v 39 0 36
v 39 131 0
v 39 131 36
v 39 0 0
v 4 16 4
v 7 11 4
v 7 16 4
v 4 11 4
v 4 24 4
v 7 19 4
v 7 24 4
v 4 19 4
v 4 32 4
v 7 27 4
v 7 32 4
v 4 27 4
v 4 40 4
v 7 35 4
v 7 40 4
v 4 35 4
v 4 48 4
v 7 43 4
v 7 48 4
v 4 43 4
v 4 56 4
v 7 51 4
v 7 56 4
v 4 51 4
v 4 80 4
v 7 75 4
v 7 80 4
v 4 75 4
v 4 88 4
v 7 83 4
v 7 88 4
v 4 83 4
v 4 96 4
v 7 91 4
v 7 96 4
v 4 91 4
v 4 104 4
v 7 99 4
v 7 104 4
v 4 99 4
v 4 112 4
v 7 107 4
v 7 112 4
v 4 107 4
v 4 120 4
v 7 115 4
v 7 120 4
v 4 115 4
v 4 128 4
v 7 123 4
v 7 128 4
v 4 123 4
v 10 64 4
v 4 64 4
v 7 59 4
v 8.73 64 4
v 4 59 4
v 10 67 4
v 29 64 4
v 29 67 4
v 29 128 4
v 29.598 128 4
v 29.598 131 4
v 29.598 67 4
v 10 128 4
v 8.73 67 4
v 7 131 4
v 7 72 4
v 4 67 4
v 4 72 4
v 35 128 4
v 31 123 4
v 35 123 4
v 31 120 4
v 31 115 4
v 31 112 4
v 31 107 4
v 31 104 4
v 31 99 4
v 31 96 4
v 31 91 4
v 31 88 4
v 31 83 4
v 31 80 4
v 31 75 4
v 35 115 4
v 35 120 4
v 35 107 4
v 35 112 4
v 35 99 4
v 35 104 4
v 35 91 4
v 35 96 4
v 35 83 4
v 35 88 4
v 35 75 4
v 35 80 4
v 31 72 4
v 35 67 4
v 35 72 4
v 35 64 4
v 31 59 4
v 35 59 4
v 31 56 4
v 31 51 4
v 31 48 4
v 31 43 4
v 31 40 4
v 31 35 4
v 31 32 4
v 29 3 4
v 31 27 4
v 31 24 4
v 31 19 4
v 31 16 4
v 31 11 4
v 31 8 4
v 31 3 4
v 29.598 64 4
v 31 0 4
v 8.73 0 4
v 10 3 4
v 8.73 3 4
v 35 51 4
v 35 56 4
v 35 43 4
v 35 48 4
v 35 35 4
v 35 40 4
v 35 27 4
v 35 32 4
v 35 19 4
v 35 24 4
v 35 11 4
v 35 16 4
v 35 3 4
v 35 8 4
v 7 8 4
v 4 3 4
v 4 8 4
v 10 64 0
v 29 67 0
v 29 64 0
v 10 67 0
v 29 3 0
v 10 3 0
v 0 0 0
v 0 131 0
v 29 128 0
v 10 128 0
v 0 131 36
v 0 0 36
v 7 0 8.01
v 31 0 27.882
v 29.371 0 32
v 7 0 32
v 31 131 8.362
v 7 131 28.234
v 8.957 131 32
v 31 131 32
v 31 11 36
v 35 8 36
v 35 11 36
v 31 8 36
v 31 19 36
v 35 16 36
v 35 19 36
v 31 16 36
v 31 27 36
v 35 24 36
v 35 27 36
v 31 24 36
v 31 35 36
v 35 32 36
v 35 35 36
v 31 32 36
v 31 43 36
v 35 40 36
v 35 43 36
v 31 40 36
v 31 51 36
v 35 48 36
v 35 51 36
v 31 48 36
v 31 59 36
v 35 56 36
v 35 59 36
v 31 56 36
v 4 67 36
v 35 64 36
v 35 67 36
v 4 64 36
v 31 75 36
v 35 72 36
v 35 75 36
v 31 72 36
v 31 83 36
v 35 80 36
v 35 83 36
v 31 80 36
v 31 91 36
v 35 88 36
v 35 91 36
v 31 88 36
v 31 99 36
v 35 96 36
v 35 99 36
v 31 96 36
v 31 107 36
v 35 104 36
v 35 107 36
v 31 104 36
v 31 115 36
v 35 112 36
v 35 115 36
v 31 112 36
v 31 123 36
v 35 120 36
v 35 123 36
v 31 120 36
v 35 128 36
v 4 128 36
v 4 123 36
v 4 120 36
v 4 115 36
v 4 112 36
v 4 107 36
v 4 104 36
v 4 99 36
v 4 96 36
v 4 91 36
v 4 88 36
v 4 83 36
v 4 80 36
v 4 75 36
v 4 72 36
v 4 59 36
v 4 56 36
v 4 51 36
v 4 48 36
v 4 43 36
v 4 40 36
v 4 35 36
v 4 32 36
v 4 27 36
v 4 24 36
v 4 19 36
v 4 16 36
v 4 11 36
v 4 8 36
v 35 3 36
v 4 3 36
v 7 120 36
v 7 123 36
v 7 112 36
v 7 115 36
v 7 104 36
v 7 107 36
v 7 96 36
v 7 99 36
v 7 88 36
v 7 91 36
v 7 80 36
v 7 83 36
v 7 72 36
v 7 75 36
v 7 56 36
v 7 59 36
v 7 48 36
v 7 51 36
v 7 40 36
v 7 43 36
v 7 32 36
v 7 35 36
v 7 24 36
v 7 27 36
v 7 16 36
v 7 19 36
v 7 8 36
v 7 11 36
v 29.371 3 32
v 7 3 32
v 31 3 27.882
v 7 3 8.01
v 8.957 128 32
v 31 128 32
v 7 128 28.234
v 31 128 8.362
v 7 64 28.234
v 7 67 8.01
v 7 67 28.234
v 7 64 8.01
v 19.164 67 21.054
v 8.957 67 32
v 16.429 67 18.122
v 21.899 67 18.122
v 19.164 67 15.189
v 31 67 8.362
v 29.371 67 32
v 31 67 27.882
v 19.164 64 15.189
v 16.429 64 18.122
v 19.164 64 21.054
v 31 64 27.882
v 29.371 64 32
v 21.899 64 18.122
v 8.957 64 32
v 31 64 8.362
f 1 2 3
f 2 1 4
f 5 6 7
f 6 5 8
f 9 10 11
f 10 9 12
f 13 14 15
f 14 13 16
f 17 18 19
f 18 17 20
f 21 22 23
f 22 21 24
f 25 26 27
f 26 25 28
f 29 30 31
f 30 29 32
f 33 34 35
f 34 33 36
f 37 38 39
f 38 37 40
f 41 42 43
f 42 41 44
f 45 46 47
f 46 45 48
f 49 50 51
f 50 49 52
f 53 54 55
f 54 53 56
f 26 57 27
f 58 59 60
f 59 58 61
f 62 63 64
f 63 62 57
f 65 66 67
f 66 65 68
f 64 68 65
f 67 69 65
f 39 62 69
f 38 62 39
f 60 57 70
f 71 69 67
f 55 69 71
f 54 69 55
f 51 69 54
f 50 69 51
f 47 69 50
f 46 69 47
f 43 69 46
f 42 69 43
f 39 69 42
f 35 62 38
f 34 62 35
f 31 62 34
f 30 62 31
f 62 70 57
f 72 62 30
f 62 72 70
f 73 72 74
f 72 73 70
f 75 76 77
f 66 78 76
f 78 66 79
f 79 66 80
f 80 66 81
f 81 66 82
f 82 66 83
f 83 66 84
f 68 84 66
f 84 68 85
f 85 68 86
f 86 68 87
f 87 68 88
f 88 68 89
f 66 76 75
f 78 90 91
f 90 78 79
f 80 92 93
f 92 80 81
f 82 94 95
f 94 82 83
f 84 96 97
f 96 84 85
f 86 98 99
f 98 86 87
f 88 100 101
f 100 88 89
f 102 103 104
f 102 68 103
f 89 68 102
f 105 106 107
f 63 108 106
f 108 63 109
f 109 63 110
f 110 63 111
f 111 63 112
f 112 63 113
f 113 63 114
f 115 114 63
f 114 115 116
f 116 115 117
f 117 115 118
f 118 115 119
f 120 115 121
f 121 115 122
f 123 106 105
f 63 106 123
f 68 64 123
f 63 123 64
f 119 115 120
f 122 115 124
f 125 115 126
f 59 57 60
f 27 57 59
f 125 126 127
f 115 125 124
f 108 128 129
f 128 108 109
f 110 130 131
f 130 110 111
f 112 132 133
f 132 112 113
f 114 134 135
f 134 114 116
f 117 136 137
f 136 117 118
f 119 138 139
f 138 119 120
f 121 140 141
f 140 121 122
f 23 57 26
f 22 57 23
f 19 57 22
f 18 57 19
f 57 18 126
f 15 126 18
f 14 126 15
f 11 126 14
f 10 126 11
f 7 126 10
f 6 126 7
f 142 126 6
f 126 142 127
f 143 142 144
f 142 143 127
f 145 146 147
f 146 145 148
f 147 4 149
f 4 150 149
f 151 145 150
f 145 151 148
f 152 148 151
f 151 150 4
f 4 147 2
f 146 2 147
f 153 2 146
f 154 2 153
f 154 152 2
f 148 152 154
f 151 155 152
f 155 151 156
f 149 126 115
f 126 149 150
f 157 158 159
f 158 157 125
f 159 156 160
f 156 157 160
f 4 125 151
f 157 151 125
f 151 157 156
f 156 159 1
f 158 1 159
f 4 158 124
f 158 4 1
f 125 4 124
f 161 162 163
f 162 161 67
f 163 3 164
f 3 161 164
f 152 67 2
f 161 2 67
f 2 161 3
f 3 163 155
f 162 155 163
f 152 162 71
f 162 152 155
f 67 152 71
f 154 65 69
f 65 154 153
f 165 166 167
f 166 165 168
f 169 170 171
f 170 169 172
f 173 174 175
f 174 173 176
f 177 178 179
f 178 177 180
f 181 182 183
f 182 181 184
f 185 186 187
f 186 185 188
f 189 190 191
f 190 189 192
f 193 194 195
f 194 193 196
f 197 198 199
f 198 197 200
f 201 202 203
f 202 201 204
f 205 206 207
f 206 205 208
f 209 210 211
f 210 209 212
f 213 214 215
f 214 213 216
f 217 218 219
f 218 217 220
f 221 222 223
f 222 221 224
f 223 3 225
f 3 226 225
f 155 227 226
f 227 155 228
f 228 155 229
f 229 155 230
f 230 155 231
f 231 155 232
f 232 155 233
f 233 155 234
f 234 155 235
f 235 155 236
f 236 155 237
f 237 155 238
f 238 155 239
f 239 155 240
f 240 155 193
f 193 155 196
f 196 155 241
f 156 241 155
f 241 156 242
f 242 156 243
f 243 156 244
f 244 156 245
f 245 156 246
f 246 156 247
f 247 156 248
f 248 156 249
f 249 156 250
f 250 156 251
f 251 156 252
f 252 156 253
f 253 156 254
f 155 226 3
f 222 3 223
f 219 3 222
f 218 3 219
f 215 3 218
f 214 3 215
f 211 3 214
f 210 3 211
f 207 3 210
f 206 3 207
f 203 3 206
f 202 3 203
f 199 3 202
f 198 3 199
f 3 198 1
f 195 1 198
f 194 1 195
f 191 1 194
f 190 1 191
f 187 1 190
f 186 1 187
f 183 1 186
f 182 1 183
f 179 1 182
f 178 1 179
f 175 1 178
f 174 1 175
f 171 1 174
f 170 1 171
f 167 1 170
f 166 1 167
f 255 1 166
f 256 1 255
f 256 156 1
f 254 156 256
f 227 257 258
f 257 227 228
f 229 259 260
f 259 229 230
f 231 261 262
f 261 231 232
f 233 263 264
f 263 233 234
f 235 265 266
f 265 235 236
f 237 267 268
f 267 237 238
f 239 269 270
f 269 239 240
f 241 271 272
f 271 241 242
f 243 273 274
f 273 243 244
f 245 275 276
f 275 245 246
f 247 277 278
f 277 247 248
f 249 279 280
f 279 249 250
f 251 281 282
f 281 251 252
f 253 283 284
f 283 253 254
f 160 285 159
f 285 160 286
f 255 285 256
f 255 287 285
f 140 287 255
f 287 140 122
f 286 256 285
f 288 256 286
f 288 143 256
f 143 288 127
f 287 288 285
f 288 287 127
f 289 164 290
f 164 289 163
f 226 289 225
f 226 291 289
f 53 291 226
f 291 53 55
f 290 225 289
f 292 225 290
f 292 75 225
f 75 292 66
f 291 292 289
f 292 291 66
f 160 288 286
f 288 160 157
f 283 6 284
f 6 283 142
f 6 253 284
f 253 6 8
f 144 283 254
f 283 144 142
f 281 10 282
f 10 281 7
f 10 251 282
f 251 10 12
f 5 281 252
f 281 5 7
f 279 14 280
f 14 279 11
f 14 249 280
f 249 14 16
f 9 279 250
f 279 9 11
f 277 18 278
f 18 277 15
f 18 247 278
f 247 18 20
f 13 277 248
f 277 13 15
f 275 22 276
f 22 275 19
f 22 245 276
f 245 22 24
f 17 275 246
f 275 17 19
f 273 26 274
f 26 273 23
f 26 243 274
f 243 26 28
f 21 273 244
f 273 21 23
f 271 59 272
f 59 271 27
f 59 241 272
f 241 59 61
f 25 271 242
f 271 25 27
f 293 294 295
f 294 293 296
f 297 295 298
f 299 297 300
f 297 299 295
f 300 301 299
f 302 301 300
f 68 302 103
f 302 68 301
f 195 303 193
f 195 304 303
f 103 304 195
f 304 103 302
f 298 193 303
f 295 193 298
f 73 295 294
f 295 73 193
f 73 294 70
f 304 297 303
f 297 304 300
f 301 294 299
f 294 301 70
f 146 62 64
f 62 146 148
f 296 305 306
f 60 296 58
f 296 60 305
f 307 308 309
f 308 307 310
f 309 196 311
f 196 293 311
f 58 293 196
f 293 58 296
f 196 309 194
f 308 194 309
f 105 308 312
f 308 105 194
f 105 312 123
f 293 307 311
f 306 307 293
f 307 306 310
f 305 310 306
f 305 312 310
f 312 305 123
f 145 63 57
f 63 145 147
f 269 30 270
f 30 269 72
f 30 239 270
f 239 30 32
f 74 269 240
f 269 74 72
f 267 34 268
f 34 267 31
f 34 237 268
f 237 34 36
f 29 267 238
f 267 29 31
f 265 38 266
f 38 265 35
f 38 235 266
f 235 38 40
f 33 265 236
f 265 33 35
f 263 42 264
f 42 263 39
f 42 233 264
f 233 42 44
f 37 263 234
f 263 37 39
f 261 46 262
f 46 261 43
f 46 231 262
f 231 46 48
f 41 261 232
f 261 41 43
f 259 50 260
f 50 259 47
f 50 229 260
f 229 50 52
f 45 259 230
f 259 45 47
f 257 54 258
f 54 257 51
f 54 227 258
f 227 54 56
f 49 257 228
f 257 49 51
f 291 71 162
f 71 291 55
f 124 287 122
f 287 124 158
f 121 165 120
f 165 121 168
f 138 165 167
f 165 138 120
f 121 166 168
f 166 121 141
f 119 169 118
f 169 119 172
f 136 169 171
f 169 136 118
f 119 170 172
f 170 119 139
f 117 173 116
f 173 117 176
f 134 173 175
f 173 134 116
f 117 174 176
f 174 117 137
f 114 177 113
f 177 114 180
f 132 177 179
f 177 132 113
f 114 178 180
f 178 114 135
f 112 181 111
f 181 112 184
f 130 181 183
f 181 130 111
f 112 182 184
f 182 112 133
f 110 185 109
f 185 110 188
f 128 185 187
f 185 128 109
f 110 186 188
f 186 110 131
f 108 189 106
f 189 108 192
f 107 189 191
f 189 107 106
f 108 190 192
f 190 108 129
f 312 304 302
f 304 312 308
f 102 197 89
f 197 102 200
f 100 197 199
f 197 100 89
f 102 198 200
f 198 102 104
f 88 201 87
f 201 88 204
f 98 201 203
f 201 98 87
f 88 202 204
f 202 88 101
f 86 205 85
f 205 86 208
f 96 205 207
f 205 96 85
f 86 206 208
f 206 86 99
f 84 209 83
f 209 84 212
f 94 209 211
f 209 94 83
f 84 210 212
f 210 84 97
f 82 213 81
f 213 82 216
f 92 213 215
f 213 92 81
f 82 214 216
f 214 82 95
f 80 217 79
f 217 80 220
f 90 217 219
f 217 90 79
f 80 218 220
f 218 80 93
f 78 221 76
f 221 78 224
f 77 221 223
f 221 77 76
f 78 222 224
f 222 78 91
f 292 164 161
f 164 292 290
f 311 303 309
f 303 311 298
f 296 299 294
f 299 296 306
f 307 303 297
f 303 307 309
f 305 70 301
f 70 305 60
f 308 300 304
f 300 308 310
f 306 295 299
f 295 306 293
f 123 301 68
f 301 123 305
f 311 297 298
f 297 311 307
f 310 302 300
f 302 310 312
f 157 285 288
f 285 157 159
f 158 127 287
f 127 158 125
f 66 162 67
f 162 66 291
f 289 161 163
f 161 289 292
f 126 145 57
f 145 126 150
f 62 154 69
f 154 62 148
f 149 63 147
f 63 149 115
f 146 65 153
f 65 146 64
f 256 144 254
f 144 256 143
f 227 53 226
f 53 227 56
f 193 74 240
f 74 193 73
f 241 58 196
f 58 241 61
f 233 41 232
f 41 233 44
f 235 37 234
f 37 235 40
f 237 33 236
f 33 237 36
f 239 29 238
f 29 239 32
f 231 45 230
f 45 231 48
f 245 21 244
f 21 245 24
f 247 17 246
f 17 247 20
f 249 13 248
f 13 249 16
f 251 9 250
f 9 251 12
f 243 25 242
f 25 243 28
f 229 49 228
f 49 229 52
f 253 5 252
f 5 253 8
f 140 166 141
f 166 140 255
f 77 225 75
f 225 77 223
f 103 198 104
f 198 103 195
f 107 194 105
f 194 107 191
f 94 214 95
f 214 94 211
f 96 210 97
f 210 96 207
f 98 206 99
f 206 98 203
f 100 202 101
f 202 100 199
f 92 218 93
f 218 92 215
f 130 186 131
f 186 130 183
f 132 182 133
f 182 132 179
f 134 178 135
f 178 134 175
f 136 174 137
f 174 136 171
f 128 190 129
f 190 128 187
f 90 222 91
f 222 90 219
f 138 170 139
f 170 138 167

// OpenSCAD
//características del vidrio
ladovidrio = 30;
grosorvidrio = 4;

//Longitud del rack depende del número de muestas que selecciones aquí:

numerodemuestras =16;

//rack
grosorparedes = 4;
longitudrack = numerodemuestras*(3+grosorvidrio+1)+3;
alturarack =32 + grosorparedes;




/////RACK
module rack()
{




//unir los lados
module lados()
{
union(){
cube([grosorparedes+ladovidrio+5,3,grosorparedes]);
translate([0,longitudrack-grosorvidrio+1,0])
cube([grosorparedes+ladovidrio+5,3,grosorparedes]);
}
}
lados();
translate([0,0,alturarack-grosorparedes])
lados();

//ladodiagonal
translate ([5,0,0])
rotate ([0,-47,0])


cube([grosorparedes+ladovidrio+5+5,3,grosorparedes]);
    
    
translate([ladovidrio+grosorparedes+2,longitudrack-grosorvidrio+1,3])
    rotate([0,-133,0])
    cube([grosorparedes+ladovidrio+5+5,3,grosorparedes]);


//separador entre dispositivos
module separador(distancia=0)
{
    translate([0,distancia,0])
    cube([grosorparedes+3,3,alturarack]);
}
    i=0;
for (i = [0:numerodemuestras])
    {
    separador(distancia= i*(3+grosorvidrio+1));
    }
translate([ladovidrio+1,0,0])
for (i = [0:numerodemuestras])
    {
    separador(distancia= i*(3+grosorvidrio+1));
    }




//fondo
cube ([10,longitudrack,grosorparedes]);
translate([ladovidrio+grosorparedes*2+1-10,0,0])
cube ([10,longitudrack,grosorparedes]);


//laterales
cube([grosorparedes,longitudrack,alturarack]);
translate([ladovidrio+grosorparedes+1,0,0])
cube([grosorparedes,longitudrack,alturarack]);
    
    
    
    //estructura central
    module central()
{
    
    if (numerodemuestras > 10)
    {
        translate([0,(longitudrack-3)/2,0])
        cube([grosorparedes+ladovidrio+5,3,grosorparedes]);
        
        
translate([0,0,alturarack-4])
        translate([0,(longitudrack-3)/2,0])
cube([grosorparedes+ladovidrio+5,3,grosorparedes]);
        
        
        
       translate([0,(longitudrack-3)/2,0]) 
      translate ([5,0,0])
rotate ([0,-47,0])
cube([grosorparedes+ladovidrio+5+5,3,grosorparedes]);  
        
        
  translate([0,(longitudrack-3)/2,0])       
  translate([ladovidrio+grosorparedes+2,3-grosorvidrio+1,3])
    rotate([0,-133,0])
    cube([grosorparedes+ladovidrio+5+5,3,grosorparedes]);     
    }
}



if (numerodemuestras > 10)
{
central();
}
 }       
 




rack(); 
        
        
        
        
        
        
        
